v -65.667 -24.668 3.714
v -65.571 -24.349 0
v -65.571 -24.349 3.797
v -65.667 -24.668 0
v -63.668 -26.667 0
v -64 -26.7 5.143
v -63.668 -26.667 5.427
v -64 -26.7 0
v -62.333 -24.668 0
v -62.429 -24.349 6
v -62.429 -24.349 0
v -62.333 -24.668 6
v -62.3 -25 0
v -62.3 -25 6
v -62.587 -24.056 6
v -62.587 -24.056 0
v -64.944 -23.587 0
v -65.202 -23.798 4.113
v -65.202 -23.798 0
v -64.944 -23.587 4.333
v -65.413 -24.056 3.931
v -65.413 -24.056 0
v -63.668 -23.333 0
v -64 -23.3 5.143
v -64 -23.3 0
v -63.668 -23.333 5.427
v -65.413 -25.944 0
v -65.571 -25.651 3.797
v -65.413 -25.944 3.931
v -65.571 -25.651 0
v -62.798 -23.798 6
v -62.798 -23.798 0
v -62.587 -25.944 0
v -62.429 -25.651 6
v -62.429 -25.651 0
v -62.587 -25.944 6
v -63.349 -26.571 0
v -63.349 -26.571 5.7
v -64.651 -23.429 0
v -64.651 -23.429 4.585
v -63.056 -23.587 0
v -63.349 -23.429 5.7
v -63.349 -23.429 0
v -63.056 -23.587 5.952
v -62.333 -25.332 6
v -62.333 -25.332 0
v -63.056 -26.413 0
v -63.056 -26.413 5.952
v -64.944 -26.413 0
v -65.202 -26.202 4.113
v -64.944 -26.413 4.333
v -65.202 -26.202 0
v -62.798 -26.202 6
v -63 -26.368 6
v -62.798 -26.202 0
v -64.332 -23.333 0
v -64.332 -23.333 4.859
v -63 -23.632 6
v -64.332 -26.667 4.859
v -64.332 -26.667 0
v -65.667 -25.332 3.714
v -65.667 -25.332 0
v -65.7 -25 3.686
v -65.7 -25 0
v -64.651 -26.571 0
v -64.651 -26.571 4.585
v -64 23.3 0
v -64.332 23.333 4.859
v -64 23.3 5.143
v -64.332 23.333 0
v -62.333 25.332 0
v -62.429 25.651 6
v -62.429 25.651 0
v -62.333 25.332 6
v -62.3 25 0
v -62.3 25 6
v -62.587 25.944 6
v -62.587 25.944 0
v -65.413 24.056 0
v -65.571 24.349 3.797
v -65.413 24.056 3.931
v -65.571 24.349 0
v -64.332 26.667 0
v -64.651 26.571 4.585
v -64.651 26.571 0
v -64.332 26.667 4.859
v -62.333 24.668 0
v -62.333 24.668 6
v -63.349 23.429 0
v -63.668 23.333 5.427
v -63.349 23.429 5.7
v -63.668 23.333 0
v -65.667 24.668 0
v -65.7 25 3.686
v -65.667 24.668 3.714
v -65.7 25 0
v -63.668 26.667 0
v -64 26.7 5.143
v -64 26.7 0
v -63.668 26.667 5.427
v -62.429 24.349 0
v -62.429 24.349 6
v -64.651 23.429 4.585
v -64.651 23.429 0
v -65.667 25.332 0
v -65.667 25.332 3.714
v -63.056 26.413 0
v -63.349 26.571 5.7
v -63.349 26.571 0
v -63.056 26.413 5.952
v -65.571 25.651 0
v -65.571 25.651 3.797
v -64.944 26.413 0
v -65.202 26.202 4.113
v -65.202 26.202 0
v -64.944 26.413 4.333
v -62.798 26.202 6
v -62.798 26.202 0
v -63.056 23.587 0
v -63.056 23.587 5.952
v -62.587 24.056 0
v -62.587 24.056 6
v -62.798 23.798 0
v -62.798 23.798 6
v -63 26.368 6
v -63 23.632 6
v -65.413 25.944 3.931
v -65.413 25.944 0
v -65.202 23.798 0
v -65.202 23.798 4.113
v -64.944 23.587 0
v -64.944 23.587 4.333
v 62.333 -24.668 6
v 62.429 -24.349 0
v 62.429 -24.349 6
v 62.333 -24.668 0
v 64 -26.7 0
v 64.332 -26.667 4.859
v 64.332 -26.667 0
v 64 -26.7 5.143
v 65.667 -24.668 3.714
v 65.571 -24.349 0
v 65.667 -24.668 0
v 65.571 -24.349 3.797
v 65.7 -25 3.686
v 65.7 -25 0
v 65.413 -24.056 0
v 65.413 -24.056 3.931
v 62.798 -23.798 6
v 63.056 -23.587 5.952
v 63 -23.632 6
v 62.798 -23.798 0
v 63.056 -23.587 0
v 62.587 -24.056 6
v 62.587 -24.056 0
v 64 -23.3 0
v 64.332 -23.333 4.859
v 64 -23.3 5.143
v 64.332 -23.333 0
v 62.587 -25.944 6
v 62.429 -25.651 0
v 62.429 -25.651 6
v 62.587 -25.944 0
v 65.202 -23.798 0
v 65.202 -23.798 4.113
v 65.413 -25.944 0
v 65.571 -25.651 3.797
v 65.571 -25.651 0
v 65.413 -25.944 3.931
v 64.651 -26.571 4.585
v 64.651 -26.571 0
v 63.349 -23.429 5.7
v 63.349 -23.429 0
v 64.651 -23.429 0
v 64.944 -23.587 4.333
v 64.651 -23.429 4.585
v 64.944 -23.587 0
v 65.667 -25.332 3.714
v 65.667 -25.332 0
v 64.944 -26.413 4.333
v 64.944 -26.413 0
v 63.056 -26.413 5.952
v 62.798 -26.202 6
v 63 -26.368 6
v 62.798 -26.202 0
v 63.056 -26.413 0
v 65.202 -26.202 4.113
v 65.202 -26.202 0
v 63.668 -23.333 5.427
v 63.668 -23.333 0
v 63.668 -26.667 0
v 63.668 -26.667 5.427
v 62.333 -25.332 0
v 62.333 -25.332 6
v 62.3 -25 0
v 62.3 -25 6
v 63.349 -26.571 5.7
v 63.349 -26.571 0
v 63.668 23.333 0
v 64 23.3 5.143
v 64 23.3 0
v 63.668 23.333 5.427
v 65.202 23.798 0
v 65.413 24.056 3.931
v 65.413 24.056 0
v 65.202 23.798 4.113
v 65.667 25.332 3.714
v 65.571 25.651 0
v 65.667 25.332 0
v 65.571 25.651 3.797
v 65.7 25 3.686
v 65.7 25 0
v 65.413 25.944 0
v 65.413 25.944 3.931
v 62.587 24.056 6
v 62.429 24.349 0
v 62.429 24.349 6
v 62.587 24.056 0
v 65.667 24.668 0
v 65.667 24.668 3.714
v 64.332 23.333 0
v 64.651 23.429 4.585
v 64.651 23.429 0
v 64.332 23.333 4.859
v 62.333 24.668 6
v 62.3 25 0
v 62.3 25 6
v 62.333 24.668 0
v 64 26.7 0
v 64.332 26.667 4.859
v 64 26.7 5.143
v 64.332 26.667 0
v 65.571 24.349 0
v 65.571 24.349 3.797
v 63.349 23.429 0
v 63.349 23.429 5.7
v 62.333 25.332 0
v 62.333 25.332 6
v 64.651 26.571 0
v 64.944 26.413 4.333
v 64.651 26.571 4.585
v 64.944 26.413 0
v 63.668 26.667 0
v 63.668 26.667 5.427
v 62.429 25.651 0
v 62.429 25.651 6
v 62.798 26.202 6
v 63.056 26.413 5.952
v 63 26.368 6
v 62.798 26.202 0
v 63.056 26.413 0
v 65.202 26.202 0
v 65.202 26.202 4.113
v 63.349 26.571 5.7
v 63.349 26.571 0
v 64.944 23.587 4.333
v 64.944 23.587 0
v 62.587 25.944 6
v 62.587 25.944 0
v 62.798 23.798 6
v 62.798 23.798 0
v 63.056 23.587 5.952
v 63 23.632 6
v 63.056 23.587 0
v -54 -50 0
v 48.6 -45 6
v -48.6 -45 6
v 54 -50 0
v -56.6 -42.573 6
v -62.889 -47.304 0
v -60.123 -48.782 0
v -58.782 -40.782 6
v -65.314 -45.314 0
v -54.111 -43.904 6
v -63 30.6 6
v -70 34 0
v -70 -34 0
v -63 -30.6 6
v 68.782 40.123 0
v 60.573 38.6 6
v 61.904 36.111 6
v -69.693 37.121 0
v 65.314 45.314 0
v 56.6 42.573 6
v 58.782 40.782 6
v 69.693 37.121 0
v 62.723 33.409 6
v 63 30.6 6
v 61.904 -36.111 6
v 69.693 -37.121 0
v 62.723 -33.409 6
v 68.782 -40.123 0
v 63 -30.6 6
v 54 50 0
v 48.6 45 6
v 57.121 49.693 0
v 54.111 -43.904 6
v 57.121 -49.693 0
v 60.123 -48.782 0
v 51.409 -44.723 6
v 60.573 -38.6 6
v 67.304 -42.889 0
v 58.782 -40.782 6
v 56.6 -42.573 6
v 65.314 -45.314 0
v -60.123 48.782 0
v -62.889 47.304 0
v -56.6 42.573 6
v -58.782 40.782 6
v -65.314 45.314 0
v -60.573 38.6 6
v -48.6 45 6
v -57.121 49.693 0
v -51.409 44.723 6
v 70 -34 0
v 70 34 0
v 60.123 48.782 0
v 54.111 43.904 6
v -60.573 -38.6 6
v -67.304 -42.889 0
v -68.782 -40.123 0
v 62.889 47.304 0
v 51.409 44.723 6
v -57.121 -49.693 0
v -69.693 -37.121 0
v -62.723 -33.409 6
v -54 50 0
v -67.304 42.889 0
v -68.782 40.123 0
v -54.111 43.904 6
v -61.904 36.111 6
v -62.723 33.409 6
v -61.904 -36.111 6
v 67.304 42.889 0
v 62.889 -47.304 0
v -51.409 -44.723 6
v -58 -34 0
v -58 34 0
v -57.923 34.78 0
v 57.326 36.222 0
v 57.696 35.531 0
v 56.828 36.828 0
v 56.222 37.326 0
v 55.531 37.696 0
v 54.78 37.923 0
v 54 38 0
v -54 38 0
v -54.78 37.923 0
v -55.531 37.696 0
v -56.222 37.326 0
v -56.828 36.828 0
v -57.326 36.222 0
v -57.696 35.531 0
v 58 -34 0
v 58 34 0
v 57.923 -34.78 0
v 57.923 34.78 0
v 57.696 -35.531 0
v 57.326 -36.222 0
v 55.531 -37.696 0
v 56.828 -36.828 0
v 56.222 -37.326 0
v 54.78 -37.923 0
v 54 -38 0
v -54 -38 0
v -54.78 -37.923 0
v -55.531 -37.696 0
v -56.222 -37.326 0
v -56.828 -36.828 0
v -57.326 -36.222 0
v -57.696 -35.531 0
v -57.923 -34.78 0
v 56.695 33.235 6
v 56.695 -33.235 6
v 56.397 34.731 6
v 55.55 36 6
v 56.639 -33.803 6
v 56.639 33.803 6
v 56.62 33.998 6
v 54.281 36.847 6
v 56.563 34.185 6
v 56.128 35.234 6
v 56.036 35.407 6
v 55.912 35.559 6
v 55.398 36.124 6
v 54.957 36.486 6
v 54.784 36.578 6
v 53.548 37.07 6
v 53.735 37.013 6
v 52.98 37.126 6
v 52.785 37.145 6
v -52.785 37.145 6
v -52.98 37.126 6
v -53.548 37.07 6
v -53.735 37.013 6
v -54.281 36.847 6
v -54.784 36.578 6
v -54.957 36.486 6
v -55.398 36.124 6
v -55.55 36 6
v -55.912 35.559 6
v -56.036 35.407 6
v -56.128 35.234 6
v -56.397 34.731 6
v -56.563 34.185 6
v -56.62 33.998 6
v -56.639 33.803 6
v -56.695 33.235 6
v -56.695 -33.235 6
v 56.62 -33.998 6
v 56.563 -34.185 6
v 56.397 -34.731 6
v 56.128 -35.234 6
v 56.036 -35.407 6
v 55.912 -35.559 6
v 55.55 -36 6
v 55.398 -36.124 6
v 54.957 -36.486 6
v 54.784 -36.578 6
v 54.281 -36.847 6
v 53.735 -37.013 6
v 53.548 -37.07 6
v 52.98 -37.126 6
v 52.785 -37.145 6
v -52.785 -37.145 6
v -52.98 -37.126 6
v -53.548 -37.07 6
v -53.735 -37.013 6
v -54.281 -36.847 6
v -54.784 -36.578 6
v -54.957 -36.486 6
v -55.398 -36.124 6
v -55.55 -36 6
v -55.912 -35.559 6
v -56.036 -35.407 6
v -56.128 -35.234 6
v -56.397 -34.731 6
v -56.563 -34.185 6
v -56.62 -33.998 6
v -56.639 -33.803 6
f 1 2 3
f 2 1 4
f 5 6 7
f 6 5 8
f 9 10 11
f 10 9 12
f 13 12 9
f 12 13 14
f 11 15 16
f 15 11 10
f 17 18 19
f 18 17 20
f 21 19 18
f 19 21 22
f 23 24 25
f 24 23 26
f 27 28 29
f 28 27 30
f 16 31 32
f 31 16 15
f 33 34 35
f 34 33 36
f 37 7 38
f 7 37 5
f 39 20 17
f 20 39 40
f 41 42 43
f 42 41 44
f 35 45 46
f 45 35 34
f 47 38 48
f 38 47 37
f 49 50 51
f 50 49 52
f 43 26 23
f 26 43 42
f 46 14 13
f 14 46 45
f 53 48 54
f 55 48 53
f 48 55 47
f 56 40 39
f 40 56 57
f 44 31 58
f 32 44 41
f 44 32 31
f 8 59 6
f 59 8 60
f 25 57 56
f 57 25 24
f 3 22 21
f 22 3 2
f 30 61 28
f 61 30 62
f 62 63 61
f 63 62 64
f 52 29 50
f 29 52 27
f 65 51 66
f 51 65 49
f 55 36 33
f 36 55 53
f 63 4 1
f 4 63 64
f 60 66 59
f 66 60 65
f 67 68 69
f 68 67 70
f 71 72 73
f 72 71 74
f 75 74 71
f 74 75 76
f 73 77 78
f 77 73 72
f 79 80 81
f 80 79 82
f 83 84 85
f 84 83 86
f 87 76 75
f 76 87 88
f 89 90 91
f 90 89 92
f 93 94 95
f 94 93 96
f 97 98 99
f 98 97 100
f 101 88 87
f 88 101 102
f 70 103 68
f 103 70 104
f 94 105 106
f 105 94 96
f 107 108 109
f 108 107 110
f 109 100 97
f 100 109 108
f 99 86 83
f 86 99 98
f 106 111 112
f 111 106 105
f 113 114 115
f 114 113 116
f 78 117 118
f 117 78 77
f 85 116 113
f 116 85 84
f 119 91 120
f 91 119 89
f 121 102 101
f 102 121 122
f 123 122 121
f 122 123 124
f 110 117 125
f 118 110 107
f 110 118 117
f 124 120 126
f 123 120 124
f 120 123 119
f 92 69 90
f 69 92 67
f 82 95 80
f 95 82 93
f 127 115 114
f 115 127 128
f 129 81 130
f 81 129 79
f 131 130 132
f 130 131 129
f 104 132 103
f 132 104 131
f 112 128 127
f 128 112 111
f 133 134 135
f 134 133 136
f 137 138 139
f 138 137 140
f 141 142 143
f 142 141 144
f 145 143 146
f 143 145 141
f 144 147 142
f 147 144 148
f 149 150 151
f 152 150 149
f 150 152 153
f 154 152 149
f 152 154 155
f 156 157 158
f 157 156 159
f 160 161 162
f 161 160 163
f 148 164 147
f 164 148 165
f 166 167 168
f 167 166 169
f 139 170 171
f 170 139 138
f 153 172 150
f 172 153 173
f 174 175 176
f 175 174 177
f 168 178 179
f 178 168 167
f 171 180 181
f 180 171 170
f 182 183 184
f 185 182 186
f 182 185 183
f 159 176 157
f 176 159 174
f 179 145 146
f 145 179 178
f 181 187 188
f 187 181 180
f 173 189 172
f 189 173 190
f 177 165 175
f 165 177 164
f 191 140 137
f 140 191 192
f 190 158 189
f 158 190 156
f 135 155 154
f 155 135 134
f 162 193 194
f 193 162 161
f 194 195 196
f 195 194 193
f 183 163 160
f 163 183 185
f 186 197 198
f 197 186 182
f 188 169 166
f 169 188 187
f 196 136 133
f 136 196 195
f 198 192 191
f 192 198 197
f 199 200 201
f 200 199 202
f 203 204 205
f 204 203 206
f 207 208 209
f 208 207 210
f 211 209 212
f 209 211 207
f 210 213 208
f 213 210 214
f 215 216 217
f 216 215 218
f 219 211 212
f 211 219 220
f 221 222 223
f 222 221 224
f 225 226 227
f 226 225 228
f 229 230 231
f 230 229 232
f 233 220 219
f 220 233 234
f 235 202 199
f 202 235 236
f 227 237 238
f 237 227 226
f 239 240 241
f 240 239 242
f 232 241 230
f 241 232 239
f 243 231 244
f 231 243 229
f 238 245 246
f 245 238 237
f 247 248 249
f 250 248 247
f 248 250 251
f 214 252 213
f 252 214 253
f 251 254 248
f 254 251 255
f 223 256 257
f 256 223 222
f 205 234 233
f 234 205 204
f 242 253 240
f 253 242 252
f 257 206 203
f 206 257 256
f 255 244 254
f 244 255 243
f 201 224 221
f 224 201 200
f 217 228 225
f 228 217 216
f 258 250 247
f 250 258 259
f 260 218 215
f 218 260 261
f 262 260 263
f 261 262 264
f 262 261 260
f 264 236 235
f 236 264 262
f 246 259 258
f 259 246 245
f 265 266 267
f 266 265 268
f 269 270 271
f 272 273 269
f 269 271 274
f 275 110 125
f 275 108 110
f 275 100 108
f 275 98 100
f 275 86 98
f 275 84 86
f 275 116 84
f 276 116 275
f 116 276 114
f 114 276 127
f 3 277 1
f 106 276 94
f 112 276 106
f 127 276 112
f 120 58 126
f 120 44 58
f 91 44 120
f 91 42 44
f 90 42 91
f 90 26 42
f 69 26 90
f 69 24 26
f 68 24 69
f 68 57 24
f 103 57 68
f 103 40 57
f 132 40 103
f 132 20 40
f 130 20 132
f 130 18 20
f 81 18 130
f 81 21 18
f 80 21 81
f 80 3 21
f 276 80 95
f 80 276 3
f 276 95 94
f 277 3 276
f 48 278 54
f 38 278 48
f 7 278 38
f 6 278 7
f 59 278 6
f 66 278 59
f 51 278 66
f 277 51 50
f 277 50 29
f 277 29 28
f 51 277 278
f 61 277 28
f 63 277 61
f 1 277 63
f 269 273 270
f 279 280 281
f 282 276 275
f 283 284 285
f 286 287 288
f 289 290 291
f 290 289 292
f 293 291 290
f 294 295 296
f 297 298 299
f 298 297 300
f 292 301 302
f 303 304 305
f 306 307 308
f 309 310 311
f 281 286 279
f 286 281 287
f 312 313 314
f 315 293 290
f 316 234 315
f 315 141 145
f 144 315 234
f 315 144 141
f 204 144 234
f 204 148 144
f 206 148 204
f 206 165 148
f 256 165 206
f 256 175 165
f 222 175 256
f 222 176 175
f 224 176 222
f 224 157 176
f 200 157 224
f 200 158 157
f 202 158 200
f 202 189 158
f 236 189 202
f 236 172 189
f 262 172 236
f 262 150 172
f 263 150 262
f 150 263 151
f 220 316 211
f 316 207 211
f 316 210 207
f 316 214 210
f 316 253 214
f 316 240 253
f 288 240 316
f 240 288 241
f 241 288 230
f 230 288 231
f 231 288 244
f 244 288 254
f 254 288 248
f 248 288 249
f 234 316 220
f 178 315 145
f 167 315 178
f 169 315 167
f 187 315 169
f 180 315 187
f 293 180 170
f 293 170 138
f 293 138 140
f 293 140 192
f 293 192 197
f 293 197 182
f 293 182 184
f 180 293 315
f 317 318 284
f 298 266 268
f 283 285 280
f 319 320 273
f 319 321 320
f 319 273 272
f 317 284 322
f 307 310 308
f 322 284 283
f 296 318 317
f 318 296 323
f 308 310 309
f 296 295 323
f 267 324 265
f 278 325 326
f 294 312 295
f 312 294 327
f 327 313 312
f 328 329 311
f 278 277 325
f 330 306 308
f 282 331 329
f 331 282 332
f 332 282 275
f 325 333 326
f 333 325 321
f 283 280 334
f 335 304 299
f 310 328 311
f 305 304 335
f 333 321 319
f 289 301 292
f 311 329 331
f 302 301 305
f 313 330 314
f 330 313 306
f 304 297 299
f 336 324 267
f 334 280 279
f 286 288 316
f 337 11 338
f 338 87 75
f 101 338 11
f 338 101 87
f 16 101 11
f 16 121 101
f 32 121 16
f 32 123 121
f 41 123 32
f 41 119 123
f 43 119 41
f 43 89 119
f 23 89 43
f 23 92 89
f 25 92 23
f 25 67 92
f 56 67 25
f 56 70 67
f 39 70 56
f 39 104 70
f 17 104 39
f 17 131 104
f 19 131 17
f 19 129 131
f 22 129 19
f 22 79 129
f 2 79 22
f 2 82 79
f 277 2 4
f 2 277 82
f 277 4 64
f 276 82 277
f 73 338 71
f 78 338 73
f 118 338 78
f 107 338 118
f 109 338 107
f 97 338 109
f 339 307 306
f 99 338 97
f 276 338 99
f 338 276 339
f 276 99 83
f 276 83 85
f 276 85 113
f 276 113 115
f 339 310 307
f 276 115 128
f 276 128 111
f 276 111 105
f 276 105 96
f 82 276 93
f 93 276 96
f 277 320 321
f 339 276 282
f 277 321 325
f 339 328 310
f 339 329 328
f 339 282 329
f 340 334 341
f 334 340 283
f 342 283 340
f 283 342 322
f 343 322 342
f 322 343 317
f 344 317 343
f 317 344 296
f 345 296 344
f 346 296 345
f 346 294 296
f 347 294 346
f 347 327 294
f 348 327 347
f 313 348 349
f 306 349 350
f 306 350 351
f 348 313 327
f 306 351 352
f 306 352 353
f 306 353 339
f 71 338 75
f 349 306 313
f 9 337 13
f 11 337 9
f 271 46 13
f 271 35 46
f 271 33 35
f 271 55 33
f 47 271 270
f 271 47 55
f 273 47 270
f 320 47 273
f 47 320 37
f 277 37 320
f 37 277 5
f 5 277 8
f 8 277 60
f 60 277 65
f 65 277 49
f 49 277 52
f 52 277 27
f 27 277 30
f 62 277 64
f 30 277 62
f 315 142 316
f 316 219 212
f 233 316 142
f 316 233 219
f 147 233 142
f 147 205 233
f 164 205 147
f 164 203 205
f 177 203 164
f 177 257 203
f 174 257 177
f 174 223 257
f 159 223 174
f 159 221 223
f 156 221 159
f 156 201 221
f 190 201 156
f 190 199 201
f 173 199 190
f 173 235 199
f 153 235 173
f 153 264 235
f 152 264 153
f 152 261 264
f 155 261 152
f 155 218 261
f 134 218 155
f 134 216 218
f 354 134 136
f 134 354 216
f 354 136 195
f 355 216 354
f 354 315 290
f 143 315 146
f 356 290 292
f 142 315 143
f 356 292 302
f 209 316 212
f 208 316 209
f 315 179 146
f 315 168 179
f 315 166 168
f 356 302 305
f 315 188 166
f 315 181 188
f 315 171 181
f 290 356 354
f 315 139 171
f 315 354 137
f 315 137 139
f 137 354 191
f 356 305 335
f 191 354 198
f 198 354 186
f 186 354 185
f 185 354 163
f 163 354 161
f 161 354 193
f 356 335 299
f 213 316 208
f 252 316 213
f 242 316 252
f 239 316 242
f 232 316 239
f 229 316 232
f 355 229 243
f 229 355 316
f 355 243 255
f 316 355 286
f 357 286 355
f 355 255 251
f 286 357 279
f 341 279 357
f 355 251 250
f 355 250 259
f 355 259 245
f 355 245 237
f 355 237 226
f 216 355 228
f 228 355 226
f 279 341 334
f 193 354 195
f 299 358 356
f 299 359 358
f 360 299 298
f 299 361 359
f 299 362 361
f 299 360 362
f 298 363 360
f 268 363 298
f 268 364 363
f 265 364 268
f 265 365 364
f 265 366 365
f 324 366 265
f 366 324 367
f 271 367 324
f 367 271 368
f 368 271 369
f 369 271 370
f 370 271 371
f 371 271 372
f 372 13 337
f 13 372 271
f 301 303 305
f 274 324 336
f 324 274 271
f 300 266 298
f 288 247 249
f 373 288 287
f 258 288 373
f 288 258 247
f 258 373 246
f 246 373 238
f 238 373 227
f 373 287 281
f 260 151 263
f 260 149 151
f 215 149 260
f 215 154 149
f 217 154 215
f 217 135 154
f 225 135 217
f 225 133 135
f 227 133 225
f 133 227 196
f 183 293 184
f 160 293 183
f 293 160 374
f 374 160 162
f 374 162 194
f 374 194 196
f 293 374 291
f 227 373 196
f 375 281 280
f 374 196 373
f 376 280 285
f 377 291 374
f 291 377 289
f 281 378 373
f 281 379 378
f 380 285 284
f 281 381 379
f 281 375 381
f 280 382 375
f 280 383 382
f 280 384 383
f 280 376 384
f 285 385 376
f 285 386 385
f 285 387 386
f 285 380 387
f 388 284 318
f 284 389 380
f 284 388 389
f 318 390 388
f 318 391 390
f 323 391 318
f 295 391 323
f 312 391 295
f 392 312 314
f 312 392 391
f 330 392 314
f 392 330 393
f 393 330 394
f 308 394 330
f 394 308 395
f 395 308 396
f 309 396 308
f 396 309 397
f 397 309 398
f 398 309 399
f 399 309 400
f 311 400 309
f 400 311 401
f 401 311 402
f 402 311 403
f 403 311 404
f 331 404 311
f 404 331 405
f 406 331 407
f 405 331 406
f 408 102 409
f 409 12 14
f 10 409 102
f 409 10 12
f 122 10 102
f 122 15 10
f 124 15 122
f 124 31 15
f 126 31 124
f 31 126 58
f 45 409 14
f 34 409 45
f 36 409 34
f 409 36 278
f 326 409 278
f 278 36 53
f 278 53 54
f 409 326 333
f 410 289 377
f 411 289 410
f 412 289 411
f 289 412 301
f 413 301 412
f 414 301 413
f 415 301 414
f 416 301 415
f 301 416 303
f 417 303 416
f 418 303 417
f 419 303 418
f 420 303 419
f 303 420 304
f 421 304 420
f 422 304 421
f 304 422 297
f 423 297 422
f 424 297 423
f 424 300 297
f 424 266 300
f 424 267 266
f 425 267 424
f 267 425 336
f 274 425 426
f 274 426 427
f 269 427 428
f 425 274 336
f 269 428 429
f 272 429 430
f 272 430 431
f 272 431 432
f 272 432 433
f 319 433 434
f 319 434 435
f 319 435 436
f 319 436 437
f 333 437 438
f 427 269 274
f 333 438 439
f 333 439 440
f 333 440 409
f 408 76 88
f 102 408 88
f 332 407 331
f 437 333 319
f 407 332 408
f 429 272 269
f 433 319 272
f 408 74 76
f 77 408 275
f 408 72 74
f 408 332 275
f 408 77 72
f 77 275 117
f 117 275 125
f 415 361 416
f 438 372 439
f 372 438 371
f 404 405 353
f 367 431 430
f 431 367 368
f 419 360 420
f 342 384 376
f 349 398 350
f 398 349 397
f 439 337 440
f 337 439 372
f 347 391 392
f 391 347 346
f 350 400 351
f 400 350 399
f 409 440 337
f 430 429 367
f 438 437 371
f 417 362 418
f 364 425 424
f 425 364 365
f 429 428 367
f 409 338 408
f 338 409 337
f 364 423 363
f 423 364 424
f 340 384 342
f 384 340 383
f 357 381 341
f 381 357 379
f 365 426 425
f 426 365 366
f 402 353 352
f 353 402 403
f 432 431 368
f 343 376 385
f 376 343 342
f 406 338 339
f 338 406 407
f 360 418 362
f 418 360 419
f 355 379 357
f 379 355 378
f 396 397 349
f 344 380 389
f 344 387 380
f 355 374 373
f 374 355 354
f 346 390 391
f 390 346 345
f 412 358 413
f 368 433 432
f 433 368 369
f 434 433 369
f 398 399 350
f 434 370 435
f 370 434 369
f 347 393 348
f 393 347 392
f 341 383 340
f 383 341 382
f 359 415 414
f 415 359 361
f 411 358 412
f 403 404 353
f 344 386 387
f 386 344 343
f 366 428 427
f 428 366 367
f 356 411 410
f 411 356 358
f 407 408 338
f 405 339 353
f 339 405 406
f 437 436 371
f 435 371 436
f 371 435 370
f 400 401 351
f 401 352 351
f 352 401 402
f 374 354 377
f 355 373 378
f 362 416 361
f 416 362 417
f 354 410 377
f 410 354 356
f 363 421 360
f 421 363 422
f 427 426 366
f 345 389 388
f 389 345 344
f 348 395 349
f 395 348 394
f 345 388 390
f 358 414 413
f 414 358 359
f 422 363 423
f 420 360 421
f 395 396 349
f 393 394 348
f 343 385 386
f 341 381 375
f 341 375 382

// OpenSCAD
$fn = 32;

// ----------------------------------------------------------------------
// Display bezel: 140 x 100 mm frame, opening 116x76 mm
// ----------------------------------------------------------------------

// --- parameters (mm) ---
length = 140;             // frame outside length, X
width = 100;              // frame outside width, Y
frame_w = 12;             // frame width
thickness = 6;            // frame thickness
corner_r = 16;            // outside corner radius
chamfer = 0.9;            // outer wall taper
funnel = 0.97;            // inner opening taper
opening_l = 116;          // opening length
opening_w = 76;           // opening width
inner_r = 4;              // opening corner radius
hole_d = 3.4;             // mounting screw clearance
holes_per_side = 2;       // holes per short side
hole_inset = 6;           // hole centre inset from the outside edge

/* rounded-rectangle outlines, generated with loops */
module rounded_ring(l_nom, w_nom, r) {
  hull() {
    for (sx = [-1, 1]) for (sy = [-1, 1])
      translate([sx * (l_nom / 2 - r), sy * (w_nom / 2 - r)]) circle(r = r);
  }
}

difference() {
  /* frame body, drafted so the outer edge is a variable-depth chamfer */
  linear_extrude(height = thickness, scale = chamfer)
    rounded_ring(length, width, corner_r);
  /* viewing opening, drafted the other way for a funnel edge */
  linear_extrude(height = thickness + 2, scale = funnel)
    translate([0, 0, -1]) rounded_ring(opening_l, opening_w, inner_r);
  /* mounting screws through the frame lands */
  for (sx = [-1, 1]) for (i = [1 : holes_per_side])
    translate([sx * (length / 2 - hole_inset),
               (i - (holes_per_side + 1) / 2) * width * 0.5, -1])
      cylinder(h = thickness + 2, d = hole_d);
}
